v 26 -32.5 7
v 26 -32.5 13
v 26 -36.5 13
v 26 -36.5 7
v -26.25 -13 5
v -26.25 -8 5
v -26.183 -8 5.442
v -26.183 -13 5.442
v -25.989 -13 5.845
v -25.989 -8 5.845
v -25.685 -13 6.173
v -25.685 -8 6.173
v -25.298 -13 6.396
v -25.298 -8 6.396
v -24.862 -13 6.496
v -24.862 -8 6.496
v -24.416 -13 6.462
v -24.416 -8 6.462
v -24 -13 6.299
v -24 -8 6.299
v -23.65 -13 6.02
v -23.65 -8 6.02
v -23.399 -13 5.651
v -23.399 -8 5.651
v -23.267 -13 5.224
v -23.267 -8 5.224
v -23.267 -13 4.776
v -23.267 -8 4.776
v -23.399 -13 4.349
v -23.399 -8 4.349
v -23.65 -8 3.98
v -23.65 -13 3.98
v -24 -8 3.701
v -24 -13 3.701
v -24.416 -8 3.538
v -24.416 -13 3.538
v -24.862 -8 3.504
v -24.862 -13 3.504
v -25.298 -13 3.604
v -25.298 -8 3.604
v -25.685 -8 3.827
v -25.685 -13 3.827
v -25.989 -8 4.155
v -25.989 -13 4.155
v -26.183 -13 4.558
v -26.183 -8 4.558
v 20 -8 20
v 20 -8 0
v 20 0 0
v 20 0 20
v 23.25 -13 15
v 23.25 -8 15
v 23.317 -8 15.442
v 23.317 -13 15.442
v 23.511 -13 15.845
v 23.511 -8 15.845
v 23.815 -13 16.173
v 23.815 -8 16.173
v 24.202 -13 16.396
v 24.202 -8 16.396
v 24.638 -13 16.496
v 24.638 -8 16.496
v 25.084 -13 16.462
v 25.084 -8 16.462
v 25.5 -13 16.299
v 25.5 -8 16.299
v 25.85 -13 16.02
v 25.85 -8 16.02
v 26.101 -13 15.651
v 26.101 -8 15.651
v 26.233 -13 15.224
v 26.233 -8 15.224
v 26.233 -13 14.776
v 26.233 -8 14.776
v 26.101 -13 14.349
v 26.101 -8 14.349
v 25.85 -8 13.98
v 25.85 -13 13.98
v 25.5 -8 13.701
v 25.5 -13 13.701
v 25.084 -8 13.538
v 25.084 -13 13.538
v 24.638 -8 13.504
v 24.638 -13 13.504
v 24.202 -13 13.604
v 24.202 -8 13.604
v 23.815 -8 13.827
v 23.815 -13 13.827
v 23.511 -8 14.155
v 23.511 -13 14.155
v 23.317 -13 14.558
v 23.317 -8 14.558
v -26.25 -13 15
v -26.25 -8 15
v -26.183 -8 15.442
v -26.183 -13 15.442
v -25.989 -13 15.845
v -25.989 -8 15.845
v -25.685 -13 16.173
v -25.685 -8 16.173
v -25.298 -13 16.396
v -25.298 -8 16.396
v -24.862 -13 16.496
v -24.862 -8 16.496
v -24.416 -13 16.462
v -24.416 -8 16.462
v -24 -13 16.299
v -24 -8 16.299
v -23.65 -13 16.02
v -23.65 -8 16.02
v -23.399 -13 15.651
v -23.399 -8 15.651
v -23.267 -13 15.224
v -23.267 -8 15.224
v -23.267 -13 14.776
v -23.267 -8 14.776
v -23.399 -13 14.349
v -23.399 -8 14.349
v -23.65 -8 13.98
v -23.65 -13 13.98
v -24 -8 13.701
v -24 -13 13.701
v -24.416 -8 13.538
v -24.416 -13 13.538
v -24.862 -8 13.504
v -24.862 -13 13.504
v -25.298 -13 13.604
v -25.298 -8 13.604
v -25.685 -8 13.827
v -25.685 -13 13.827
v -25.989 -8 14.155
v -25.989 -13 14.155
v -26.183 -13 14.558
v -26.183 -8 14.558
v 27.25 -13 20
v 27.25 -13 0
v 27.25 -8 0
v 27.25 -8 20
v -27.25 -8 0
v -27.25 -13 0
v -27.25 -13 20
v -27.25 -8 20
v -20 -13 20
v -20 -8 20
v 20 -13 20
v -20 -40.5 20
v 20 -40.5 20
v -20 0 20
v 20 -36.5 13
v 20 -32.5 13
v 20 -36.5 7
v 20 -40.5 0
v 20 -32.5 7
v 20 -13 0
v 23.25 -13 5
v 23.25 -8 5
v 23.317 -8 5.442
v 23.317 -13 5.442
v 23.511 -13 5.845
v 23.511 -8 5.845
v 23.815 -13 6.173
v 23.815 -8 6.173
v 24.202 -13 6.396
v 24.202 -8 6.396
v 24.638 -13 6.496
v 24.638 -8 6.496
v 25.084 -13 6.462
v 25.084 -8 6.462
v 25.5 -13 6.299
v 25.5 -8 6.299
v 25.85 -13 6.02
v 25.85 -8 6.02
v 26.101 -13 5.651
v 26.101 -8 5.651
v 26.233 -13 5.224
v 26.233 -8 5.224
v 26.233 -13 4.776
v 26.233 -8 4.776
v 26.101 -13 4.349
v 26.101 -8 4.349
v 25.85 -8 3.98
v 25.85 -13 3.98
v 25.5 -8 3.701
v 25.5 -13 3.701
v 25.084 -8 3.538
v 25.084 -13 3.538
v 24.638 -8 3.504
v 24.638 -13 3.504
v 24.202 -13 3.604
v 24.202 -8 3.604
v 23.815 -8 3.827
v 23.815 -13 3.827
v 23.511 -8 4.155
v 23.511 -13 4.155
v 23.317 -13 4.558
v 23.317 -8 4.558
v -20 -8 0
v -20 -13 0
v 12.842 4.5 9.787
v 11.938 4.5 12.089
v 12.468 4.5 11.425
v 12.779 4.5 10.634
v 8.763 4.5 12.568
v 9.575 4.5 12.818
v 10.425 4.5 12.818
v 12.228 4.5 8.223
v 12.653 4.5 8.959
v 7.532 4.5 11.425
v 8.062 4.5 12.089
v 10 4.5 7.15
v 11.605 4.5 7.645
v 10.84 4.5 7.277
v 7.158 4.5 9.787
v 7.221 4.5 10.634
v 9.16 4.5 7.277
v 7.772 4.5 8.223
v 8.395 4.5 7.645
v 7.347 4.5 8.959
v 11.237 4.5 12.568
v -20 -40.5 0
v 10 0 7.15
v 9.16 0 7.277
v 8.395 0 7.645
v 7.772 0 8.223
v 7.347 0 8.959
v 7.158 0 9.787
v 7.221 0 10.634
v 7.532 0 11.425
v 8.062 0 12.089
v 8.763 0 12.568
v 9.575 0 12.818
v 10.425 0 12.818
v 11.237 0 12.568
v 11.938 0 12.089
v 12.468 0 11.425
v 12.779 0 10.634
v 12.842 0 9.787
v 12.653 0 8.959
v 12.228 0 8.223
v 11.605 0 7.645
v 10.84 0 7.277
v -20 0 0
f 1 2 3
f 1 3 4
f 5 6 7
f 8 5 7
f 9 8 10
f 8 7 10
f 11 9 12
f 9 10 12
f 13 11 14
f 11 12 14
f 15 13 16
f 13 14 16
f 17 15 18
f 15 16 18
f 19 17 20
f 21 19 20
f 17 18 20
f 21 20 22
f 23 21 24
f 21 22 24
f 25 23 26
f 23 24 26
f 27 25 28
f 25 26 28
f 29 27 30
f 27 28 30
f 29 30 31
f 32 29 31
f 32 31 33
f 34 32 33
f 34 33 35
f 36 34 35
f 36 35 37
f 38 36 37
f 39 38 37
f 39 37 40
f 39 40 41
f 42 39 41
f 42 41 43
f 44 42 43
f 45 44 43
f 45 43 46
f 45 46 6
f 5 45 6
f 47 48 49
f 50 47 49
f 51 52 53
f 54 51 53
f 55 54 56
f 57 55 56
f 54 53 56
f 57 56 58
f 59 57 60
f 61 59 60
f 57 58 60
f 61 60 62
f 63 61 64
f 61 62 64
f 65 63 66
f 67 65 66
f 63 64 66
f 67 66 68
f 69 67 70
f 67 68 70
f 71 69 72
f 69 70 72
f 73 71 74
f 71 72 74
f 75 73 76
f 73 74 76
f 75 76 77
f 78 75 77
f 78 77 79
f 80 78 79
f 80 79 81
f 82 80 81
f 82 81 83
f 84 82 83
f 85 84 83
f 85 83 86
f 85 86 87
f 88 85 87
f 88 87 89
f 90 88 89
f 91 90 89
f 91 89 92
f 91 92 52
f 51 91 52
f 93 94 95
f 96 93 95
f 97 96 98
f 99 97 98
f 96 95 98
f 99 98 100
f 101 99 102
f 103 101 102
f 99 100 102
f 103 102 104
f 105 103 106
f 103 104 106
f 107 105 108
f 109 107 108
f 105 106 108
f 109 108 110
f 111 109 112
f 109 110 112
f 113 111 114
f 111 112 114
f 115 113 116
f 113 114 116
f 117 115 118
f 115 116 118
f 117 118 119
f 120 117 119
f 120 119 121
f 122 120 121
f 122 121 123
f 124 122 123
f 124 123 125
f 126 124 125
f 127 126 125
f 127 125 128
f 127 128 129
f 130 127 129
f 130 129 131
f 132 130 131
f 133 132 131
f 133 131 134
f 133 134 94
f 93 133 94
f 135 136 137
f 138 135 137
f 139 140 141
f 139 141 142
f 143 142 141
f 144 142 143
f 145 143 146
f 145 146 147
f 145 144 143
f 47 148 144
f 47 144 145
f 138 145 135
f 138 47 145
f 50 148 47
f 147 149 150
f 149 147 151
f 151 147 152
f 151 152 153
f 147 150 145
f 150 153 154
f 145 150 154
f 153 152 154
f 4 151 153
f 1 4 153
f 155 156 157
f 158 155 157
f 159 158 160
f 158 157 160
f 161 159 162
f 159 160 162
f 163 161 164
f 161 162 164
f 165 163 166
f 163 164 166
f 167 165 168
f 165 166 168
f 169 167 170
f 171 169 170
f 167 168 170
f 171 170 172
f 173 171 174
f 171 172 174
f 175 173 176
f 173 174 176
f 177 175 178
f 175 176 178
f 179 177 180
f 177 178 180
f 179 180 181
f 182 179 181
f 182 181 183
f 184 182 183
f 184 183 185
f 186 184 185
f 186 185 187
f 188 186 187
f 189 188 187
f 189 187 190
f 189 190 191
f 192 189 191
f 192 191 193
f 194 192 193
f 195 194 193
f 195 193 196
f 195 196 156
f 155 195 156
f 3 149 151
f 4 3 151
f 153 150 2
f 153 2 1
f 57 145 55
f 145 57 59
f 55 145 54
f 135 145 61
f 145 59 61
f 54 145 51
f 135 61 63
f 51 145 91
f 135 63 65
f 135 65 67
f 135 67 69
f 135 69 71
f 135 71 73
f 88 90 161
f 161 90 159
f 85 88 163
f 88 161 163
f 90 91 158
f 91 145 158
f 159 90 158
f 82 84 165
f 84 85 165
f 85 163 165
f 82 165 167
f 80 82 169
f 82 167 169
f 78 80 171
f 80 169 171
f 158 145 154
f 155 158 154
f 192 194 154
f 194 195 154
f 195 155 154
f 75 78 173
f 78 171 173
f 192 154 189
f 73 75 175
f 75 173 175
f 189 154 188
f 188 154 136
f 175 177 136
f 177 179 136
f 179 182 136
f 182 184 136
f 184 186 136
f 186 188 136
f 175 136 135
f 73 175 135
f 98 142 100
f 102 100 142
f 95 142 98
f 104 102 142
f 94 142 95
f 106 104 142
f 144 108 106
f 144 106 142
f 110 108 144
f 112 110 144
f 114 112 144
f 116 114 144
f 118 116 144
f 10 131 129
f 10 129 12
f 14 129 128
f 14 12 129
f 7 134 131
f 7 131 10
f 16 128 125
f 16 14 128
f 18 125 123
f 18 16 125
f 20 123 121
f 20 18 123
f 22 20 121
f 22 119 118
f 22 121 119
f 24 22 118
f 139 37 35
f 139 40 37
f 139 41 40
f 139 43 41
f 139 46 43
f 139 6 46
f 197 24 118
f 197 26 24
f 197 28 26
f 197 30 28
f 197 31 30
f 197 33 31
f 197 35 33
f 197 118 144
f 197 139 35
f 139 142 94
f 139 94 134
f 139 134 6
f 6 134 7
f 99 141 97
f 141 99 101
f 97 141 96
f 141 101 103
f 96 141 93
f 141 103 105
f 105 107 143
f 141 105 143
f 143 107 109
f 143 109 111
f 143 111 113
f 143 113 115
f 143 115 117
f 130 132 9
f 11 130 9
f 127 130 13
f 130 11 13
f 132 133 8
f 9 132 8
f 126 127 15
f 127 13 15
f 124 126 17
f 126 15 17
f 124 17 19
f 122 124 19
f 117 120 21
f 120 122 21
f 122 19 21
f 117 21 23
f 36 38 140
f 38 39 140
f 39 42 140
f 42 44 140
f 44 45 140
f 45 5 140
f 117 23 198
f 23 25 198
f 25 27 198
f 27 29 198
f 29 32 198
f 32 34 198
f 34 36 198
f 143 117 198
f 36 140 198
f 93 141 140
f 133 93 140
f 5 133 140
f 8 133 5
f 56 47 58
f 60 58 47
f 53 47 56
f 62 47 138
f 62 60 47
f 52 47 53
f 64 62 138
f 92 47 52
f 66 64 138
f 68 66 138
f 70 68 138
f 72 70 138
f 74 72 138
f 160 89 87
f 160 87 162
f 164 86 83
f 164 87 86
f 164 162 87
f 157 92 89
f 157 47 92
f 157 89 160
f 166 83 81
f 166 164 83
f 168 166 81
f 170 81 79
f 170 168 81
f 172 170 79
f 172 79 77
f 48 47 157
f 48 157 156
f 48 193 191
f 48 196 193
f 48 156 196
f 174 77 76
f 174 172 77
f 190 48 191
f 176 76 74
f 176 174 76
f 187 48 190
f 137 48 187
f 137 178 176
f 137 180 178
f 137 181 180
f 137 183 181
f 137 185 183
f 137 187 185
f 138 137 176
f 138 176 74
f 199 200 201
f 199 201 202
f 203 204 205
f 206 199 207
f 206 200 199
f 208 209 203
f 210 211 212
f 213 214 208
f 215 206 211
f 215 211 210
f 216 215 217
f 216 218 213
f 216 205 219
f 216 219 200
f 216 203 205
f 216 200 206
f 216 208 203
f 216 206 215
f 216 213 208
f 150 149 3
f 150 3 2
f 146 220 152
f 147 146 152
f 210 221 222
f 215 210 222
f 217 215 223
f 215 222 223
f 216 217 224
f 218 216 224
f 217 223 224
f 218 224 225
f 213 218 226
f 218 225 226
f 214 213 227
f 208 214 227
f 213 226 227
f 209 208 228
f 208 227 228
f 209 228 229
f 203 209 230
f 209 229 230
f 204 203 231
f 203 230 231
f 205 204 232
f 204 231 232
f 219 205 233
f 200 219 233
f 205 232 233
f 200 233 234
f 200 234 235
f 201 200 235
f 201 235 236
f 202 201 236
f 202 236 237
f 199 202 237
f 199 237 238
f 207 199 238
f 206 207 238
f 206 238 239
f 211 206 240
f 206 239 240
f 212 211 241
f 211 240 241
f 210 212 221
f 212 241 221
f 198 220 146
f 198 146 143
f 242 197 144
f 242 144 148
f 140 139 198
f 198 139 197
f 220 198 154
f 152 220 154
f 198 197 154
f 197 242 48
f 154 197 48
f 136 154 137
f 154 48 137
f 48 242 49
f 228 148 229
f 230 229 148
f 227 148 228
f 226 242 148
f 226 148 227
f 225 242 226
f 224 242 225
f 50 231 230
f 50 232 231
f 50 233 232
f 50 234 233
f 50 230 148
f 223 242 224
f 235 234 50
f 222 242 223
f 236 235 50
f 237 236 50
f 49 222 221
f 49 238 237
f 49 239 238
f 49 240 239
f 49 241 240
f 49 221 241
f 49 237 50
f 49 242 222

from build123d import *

# Parameters (mm, degrees)
SKETCH1_W           = 40
SKETCH1_H           = 8
SKETCH1_W_2         = 7.25
SKETCH1_H_2         = 5
SKETCH1_H_3         = 27.5
BOSS_EXTRUDE1_DEPTH = 20
SKETCH2_R           = 2.85
BOSS_EXTRUDE2_DEPTH = 4.5
SKETCH3_R           = 1.5
CUT_EXTRUDE1_DEPTH  = 47.891497097
SKETCH4_W           = 6
SKETCH4_H           = 4
BOSS_EXTRUDE3_DEPTH = 6


with BuildPart() as part:
    # Sketch1 → Boss-Extrude1 (new body)
    with BuildSketch(Plane.XY):
        with Locations((0, -4)):
            Rectangle(SKETCH1_W, SKETCH1_H)
        with Locations((-23.625, -10.5)):
            Rectangle(SKETCH1_W_2, SKETCH1_H_2)
        with Locations((0, -10.5)):
            Rectangle(SKETCH1_W, SKETCH1_H_2)
        with Locations((23.625, -10.5)):
            Rectangle(SKETCH1_W_2, SKETCH1_H_2)
        with Locations((0, -26.75)):
            Rectangle(SKETCH1_W, SKETCH1_H_3)
    extrude(amount=BOSS_EXTRUDE1_DEPTH)

    # Sketch2 → Boss-Extrude2 (add)
    with BuildSketch(Plane(origin=(0, 0, 0), x_dir=(1, 0, 0), z_dir=(0, 1, 0))):
        with Locations(Location((10, -10, 0), (0, 0, 90))):
            Circle(SKETCH2_R)
    extrude(amount=BOSS_EXTRUDE2_DEPTH)

    # Sketch3 → Cut-Extrude1 (cut, through all)
    with BuildSketch(Plane(origin=(0, -8, 0), x_dir=(1, 0, 0), z_dir=(0, 1, 0))):
        with Locations(Location((-24.75, -5, 0), (0, 0, 180))):
            Circle(SKETCH3_R)
        with Locations(Location((-24.75, -15, 0), (0, 0, 180))):
            Circle(SKETCH3_R)
        with Locations(Location((24.75, -15, 0), (0, 0, 180))):
            Circle(SKETCH3_R)
        with Locations(Location((24.75, -5, 0), (0, 0, 180))):
            Circle(SKETCH3_R)
    extrude(amount=-CUT_EXTRUDE1_DEPTH, mode=Mode.SUBTRACT)

    # Sketch4 → Boss-Extrude3 (add)
    with BuildSketch(Plane(origin=(20, 0, 0), x_dir=(0, 0, -1), z_dir=(1, 0, 0))):
        with Locations((-10, -34.5)):
            Rectangle(SKETCH4_W, SKETCH4_H)
    extrude(amount=BOSS_EXTRUDE3_DEPTH)


solid = part.part
